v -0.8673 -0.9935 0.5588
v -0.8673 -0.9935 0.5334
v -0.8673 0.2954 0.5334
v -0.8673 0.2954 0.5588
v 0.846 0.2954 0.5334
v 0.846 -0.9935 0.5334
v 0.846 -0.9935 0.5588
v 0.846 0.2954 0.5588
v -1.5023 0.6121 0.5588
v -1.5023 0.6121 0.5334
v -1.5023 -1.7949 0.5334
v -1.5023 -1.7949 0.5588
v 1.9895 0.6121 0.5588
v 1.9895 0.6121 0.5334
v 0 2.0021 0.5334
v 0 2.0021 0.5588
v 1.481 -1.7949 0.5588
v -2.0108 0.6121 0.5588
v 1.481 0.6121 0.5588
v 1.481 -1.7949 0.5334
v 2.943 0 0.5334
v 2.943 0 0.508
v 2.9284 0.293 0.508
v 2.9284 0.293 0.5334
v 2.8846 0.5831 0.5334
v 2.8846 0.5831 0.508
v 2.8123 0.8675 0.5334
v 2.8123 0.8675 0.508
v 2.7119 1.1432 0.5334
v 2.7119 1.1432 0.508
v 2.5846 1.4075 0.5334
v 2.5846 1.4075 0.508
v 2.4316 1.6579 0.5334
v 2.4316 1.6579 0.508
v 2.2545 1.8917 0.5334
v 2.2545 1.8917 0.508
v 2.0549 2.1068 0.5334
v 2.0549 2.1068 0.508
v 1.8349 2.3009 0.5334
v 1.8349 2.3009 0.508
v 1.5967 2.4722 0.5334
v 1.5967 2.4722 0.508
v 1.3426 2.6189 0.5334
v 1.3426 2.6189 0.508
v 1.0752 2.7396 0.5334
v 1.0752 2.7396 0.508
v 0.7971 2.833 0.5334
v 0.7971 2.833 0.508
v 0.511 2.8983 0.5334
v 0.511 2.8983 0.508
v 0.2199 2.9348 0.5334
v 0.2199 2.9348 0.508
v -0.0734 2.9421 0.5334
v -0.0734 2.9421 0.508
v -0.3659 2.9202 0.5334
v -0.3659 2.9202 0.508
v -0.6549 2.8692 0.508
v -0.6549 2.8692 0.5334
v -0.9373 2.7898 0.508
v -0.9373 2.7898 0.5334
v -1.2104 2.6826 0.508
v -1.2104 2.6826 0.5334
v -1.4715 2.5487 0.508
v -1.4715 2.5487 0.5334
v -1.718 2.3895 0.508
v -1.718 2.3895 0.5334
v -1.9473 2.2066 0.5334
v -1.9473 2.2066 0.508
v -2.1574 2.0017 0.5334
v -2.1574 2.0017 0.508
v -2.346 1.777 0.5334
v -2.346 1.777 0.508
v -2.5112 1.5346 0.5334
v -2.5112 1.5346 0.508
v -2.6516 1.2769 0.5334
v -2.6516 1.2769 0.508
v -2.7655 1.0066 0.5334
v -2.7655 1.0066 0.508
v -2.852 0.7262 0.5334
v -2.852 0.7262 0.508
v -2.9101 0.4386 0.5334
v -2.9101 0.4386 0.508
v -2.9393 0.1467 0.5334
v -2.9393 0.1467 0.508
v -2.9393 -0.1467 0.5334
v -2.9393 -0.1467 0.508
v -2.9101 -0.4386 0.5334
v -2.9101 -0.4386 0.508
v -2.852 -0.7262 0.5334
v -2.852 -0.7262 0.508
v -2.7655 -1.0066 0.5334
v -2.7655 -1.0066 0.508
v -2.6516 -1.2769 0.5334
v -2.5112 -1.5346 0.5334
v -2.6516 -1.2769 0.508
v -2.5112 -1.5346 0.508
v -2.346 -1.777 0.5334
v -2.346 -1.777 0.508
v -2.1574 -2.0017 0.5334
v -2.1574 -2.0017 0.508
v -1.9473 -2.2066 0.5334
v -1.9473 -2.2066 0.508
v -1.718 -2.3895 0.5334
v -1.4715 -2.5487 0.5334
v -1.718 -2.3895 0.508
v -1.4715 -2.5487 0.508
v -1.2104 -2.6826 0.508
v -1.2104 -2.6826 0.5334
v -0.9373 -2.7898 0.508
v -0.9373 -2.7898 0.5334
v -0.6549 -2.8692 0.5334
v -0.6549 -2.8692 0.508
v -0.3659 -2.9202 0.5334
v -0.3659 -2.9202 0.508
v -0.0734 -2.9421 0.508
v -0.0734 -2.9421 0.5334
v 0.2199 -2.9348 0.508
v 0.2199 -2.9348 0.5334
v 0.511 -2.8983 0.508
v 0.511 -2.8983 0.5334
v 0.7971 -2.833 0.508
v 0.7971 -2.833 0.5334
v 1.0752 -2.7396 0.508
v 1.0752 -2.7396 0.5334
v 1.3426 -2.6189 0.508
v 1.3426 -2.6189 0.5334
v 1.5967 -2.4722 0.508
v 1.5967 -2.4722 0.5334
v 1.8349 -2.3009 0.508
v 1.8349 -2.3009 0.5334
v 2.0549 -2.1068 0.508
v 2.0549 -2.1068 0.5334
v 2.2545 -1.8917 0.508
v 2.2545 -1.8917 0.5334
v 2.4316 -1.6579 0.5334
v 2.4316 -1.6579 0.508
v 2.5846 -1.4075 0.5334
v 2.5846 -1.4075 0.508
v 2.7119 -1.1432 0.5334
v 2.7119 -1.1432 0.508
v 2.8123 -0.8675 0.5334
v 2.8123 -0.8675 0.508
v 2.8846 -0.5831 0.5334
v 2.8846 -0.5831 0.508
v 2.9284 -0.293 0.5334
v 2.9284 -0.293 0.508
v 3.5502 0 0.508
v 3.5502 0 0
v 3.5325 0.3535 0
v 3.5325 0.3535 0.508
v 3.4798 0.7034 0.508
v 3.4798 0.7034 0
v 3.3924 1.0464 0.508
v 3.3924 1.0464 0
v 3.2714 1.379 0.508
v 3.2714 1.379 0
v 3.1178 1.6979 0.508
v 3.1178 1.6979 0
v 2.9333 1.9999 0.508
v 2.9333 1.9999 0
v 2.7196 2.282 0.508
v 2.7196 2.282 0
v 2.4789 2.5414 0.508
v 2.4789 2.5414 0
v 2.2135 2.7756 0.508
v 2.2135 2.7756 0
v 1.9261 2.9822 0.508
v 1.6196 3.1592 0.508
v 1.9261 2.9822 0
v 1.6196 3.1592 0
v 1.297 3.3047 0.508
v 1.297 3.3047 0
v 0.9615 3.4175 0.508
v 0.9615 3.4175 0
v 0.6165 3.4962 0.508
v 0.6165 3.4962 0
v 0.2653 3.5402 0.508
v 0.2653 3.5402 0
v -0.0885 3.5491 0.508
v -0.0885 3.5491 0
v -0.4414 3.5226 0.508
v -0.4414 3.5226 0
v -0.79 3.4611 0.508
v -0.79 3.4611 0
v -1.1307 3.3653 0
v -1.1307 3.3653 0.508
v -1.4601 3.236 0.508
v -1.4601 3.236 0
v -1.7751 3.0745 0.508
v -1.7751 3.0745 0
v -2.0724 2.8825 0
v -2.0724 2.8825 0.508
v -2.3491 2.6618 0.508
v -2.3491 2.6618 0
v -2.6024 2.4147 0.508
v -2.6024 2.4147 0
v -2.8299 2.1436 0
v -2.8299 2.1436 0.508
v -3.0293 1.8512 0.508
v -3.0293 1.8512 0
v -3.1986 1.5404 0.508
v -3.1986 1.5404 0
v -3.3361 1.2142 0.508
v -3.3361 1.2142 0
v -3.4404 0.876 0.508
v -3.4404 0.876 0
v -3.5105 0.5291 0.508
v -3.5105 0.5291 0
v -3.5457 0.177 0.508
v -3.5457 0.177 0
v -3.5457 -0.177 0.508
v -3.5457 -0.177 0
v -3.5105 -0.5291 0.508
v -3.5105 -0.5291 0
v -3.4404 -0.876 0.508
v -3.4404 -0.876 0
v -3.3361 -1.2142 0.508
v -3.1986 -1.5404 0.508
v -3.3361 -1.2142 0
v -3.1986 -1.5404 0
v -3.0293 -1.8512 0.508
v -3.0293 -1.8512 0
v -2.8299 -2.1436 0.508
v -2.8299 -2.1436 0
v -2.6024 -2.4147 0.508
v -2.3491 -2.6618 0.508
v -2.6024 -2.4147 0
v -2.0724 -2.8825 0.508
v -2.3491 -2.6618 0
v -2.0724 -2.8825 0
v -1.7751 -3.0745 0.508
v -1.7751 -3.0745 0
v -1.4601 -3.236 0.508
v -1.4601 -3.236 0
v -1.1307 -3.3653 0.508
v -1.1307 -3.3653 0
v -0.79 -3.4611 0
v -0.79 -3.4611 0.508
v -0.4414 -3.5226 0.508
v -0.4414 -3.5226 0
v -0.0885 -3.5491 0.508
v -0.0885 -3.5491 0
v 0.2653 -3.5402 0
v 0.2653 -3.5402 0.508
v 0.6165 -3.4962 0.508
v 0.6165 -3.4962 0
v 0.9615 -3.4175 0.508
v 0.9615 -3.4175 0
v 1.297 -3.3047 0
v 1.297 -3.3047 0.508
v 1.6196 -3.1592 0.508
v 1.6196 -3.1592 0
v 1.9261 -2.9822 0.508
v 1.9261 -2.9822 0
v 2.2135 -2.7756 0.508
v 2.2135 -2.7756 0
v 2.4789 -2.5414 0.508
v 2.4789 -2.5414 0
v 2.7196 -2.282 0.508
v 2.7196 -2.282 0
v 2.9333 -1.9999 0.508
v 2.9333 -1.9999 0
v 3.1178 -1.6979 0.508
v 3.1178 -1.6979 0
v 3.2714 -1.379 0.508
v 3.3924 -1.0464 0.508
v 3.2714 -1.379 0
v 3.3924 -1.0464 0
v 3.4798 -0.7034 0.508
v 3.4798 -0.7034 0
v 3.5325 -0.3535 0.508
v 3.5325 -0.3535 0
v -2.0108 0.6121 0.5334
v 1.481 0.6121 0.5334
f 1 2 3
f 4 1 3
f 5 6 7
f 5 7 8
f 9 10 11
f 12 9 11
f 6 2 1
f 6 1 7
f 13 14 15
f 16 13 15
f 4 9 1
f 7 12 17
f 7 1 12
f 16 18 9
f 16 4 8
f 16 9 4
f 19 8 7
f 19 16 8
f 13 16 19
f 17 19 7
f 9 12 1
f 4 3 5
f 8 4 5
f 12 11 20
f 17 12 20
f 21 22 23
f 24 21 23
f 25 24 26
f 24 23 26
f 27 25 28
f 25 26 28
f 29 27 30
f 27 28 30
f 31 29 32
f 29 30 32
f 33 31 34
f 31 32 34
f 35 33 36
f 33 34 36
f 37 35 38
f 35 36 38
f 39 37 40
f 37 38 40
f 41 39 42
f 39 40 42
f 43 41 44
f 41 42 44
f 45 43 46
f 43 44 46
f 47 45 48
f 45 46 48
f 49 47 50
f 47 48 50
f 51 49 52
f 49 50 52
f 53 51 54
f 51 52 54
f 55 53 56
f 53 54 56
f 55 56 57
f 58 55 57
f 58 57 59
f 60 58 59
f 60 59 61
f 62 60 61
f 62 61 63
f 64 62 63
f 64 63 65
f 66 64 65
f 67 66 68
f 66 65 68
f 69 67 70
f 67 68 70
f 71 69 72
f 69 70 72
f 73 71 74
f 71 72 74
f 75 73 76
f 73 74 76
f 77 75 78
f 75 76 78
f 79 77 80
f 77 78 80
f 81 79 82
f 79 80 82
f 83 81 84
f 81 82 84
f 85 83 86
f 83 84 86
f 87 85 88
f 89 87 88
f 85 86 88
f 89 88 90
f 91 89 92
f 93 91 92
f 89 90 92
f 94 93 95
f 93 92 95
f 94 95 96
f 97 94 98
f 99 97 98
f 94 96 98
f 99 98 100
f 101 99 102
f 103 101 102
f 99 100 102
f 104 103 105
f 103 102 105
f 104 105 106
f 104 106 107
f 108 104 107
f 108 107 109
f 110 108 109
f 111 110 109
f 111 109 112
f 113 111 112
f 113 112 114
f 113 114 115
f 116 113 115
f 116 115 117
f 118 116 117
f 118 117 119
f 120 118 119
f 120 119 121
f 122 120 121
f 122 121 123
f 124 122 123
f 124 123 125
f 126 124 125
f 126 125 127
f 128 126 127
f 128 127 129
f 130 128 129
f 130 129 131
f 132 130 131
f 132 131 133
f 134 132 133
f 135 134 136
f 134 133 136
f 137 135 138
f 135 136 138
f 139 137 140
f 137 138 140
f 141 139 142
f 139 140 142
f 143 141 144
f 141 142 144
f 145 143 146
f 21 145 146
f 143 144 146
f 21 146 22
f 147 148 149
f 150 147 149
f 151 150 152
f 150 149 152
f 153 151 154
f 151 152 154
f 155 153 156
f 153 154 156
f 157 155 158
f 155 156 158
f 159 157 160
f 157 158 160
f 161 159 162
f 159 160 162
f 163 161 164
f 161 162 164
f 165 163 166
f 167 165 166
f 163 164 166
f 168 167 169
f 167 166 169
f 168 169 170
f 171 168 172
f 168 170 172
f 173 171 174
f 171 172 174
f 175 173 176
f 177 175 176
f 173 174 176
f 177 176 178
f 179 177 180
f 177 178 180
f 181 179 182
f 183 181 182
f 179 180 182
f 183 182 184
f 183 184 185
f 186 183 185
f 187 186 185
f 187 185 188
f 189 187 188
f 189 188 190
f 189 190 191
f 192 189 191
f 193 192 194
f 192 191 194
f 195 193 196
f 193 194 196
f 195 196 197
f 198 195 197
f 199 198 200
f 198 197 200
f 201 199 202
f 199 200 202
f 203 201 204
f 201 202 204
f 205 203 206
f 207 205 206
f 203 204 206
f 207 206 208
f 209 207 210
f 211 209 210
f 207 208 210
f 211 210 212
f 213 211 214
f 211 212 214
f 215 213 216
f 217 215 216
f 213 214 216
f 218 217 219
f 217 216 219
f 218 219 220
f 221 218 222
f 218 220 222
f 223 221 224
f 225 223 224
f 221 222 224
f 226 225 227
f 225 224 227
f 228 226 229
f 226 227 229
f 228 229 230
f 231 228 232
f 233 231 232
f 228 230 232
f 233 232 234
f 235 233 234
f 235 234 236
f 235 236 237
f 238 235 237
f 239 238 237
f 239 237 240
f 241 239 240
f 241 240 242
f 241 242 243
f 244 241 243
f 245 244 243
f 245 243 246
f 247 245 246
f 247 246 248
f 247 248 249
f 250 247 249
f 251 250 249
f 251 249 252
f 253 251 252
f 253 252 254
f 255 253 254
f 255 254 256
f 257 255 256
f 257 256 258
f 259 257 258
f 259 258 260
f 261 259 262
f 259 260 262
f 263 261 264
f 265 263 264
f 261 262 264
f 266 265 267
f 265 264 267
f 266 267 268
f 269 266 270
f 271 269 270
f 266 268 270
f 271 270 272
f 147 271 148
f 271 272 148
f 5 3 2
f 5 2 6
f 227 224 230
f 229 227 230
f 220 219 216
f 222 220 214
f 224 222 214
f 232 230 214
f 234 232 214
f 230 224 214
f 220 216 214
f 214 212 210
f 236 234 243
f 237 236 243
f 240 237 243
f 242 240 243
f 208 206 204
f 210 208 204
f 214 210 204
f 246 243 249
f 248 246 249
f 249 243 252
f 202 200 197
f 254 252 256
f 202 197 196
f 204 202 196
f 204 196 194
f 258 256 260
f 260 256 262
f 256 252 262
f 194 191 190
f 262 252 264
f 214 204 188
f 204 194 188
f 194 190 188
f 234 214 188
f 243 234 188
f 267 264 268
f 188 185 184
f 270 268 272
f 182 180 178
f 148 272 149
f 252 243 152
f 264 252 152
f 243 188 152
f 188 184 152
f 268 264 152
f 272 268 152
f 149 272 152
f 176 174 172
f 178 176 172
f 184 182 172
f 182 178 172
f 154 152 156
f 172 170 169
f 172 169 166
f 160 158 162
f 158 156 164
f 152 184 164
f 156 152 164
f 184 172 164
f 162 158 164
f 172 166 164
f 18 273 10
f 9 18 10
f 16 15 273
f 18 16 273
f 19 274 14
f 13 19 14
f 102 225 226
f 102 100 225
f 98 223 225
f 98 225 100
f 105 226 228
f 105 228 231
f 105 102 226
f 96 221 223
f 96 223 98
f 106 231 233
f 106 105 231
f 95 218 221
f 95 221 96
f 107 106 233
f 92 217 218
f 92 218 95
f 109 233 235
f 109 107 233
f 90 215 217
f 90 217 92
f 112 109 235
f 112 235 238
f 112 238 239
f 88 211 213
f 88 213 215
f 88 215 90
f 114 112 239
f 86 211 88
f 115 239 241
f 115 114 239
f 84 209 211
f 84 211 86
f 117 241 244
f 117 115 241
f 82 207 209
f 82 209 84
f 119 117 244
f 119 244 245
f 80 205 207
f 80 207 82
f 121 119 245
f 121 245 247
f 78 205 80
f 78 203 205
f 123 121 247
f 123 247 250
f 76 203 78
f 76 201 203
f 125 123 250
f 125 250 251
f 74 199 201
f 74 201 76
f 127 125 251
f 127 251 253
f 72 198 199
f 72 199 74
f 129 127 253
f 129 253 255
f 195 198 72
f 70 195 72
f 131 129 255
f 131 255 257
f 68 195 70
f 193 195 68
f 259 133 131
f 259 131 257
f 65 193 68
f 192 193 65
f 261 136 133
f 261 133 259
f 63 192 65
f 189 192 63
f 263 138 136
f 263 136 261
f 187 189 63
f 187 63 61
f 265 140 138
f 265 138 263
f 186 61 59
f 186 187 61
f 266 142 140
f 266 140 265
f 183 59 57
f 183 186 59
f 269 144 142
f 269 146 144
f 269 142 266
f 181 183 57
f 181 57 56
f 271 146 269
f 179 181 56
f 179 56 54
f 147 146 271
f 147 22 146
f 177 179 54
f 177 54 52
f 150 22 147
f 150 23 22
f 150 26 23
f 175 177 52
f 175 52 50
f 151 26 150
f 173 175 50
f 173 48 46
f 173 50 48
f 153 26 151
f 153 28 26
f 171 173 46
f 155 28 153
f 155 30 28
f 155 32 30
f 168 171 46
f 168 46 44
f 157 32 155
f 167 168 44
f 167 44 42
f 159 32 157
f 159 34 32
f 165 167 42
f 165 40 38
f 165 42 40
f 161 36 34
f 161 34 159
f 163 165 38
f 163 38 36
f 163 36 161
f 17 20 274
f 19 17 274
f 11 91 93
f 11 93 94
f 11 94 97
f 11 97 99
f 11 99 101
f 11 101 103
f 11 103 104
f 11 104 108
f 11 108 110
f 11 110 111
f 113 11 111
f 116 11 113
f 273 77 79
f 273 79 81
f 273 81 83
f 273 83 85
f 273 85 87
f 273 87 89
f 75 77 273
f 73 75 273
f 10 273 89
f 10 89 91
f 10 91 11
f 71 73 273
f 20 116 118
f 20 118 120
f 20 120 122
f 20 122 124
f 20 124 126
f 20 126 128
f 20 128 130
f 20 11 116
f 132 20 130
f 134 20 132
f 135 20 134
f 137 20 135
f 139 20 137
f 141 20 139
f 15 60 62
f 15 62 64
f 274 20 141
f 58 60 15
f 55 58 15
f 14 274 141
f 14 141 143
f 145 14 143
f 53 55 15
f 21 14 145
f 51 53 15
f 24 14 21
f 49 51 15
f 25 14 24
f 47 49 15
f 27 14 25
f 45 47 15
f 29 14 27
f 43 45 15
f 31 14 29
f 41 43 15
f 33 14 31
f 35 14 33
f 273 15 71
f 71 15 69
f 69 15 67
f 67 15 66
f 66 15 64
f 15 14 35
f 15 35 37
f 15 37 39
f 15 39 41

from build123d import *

# Parameters (mm, degrees)
F0_R     = 3.550157
F1_DEPTH = 0.508
F2_R     = 2.943
F3_DEPTH = 0.0254
F4_W     = 1.713301
F4_H     = 1.288881
F5_DEPTH = 0.0254


with BuildPart() as f1:
    # F0 (on Top) → F1 (new body)
    with BuildSketch(Plane.XY):
        Circle(F0_R)
    extrude(amount=F1_DEPTH)

    # F2 (on face) → F3 (join)
    with BuildSketch(Plane.XY.offset(0.508)):
        Circle(F2_R)
    extrude(amount=F3_DEPTH)

    # F4 (on face) → F5 (join)
    with BuildSketch(Plane.XY.offset(0.5334)):
        Polygon((-1.502313, -1.794855), (1.480988, -1.794855), (1.480988, 0.612127), (1.989505, 0.612127), (0, 2.002074), (-2.010831, 0.612127), (-1.502313, 0.612127), align=None)
        with Locations((-0.010663, -0.349021)):
            Rectangle(F4_W, F4_H, mode=Mode.SUBTRACT)
    extrude(amount=F5_DEPTH)


solid = f1.part
